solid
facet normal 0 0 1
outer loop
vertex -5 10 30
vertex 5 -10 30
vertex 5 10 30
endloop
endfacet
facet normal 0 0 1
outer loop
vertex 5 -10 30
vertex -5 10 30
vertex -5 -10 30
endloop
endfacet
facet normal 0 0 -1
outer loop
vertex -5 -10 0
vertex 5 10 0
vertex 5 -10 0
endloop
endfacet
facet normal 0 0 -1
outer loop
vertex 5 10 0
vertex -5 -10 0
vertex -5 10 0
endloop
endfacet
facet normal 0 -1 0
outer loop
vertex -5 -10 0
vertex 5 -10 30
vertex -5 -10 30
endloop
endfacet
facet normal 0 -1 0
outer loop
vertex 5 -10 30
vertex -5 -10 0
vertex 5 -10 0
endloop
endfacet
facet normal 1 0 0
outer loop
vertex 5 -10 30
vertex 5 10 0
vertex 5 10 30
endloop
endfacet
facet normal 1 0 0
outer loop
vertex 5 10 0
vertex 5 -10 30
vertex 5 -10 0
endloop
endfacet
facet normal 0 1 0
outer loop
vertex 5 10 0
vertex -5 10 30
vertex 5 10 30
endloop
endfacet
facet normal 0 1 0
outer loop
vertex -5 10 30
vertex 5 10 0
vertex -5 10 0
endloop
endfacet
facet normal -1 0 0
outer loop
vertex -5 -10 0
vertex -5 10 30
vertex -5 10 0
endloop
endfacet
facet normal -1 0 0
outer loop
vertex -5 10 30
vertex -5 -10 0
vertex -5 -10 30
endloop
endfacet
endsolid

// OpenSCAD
// Generated by scadwright. Do not hand-edit —
// edit the Python source and regenerate.

translate([-5, -10, 0]) {
    cube([10, 20, 30], center=false);
}
